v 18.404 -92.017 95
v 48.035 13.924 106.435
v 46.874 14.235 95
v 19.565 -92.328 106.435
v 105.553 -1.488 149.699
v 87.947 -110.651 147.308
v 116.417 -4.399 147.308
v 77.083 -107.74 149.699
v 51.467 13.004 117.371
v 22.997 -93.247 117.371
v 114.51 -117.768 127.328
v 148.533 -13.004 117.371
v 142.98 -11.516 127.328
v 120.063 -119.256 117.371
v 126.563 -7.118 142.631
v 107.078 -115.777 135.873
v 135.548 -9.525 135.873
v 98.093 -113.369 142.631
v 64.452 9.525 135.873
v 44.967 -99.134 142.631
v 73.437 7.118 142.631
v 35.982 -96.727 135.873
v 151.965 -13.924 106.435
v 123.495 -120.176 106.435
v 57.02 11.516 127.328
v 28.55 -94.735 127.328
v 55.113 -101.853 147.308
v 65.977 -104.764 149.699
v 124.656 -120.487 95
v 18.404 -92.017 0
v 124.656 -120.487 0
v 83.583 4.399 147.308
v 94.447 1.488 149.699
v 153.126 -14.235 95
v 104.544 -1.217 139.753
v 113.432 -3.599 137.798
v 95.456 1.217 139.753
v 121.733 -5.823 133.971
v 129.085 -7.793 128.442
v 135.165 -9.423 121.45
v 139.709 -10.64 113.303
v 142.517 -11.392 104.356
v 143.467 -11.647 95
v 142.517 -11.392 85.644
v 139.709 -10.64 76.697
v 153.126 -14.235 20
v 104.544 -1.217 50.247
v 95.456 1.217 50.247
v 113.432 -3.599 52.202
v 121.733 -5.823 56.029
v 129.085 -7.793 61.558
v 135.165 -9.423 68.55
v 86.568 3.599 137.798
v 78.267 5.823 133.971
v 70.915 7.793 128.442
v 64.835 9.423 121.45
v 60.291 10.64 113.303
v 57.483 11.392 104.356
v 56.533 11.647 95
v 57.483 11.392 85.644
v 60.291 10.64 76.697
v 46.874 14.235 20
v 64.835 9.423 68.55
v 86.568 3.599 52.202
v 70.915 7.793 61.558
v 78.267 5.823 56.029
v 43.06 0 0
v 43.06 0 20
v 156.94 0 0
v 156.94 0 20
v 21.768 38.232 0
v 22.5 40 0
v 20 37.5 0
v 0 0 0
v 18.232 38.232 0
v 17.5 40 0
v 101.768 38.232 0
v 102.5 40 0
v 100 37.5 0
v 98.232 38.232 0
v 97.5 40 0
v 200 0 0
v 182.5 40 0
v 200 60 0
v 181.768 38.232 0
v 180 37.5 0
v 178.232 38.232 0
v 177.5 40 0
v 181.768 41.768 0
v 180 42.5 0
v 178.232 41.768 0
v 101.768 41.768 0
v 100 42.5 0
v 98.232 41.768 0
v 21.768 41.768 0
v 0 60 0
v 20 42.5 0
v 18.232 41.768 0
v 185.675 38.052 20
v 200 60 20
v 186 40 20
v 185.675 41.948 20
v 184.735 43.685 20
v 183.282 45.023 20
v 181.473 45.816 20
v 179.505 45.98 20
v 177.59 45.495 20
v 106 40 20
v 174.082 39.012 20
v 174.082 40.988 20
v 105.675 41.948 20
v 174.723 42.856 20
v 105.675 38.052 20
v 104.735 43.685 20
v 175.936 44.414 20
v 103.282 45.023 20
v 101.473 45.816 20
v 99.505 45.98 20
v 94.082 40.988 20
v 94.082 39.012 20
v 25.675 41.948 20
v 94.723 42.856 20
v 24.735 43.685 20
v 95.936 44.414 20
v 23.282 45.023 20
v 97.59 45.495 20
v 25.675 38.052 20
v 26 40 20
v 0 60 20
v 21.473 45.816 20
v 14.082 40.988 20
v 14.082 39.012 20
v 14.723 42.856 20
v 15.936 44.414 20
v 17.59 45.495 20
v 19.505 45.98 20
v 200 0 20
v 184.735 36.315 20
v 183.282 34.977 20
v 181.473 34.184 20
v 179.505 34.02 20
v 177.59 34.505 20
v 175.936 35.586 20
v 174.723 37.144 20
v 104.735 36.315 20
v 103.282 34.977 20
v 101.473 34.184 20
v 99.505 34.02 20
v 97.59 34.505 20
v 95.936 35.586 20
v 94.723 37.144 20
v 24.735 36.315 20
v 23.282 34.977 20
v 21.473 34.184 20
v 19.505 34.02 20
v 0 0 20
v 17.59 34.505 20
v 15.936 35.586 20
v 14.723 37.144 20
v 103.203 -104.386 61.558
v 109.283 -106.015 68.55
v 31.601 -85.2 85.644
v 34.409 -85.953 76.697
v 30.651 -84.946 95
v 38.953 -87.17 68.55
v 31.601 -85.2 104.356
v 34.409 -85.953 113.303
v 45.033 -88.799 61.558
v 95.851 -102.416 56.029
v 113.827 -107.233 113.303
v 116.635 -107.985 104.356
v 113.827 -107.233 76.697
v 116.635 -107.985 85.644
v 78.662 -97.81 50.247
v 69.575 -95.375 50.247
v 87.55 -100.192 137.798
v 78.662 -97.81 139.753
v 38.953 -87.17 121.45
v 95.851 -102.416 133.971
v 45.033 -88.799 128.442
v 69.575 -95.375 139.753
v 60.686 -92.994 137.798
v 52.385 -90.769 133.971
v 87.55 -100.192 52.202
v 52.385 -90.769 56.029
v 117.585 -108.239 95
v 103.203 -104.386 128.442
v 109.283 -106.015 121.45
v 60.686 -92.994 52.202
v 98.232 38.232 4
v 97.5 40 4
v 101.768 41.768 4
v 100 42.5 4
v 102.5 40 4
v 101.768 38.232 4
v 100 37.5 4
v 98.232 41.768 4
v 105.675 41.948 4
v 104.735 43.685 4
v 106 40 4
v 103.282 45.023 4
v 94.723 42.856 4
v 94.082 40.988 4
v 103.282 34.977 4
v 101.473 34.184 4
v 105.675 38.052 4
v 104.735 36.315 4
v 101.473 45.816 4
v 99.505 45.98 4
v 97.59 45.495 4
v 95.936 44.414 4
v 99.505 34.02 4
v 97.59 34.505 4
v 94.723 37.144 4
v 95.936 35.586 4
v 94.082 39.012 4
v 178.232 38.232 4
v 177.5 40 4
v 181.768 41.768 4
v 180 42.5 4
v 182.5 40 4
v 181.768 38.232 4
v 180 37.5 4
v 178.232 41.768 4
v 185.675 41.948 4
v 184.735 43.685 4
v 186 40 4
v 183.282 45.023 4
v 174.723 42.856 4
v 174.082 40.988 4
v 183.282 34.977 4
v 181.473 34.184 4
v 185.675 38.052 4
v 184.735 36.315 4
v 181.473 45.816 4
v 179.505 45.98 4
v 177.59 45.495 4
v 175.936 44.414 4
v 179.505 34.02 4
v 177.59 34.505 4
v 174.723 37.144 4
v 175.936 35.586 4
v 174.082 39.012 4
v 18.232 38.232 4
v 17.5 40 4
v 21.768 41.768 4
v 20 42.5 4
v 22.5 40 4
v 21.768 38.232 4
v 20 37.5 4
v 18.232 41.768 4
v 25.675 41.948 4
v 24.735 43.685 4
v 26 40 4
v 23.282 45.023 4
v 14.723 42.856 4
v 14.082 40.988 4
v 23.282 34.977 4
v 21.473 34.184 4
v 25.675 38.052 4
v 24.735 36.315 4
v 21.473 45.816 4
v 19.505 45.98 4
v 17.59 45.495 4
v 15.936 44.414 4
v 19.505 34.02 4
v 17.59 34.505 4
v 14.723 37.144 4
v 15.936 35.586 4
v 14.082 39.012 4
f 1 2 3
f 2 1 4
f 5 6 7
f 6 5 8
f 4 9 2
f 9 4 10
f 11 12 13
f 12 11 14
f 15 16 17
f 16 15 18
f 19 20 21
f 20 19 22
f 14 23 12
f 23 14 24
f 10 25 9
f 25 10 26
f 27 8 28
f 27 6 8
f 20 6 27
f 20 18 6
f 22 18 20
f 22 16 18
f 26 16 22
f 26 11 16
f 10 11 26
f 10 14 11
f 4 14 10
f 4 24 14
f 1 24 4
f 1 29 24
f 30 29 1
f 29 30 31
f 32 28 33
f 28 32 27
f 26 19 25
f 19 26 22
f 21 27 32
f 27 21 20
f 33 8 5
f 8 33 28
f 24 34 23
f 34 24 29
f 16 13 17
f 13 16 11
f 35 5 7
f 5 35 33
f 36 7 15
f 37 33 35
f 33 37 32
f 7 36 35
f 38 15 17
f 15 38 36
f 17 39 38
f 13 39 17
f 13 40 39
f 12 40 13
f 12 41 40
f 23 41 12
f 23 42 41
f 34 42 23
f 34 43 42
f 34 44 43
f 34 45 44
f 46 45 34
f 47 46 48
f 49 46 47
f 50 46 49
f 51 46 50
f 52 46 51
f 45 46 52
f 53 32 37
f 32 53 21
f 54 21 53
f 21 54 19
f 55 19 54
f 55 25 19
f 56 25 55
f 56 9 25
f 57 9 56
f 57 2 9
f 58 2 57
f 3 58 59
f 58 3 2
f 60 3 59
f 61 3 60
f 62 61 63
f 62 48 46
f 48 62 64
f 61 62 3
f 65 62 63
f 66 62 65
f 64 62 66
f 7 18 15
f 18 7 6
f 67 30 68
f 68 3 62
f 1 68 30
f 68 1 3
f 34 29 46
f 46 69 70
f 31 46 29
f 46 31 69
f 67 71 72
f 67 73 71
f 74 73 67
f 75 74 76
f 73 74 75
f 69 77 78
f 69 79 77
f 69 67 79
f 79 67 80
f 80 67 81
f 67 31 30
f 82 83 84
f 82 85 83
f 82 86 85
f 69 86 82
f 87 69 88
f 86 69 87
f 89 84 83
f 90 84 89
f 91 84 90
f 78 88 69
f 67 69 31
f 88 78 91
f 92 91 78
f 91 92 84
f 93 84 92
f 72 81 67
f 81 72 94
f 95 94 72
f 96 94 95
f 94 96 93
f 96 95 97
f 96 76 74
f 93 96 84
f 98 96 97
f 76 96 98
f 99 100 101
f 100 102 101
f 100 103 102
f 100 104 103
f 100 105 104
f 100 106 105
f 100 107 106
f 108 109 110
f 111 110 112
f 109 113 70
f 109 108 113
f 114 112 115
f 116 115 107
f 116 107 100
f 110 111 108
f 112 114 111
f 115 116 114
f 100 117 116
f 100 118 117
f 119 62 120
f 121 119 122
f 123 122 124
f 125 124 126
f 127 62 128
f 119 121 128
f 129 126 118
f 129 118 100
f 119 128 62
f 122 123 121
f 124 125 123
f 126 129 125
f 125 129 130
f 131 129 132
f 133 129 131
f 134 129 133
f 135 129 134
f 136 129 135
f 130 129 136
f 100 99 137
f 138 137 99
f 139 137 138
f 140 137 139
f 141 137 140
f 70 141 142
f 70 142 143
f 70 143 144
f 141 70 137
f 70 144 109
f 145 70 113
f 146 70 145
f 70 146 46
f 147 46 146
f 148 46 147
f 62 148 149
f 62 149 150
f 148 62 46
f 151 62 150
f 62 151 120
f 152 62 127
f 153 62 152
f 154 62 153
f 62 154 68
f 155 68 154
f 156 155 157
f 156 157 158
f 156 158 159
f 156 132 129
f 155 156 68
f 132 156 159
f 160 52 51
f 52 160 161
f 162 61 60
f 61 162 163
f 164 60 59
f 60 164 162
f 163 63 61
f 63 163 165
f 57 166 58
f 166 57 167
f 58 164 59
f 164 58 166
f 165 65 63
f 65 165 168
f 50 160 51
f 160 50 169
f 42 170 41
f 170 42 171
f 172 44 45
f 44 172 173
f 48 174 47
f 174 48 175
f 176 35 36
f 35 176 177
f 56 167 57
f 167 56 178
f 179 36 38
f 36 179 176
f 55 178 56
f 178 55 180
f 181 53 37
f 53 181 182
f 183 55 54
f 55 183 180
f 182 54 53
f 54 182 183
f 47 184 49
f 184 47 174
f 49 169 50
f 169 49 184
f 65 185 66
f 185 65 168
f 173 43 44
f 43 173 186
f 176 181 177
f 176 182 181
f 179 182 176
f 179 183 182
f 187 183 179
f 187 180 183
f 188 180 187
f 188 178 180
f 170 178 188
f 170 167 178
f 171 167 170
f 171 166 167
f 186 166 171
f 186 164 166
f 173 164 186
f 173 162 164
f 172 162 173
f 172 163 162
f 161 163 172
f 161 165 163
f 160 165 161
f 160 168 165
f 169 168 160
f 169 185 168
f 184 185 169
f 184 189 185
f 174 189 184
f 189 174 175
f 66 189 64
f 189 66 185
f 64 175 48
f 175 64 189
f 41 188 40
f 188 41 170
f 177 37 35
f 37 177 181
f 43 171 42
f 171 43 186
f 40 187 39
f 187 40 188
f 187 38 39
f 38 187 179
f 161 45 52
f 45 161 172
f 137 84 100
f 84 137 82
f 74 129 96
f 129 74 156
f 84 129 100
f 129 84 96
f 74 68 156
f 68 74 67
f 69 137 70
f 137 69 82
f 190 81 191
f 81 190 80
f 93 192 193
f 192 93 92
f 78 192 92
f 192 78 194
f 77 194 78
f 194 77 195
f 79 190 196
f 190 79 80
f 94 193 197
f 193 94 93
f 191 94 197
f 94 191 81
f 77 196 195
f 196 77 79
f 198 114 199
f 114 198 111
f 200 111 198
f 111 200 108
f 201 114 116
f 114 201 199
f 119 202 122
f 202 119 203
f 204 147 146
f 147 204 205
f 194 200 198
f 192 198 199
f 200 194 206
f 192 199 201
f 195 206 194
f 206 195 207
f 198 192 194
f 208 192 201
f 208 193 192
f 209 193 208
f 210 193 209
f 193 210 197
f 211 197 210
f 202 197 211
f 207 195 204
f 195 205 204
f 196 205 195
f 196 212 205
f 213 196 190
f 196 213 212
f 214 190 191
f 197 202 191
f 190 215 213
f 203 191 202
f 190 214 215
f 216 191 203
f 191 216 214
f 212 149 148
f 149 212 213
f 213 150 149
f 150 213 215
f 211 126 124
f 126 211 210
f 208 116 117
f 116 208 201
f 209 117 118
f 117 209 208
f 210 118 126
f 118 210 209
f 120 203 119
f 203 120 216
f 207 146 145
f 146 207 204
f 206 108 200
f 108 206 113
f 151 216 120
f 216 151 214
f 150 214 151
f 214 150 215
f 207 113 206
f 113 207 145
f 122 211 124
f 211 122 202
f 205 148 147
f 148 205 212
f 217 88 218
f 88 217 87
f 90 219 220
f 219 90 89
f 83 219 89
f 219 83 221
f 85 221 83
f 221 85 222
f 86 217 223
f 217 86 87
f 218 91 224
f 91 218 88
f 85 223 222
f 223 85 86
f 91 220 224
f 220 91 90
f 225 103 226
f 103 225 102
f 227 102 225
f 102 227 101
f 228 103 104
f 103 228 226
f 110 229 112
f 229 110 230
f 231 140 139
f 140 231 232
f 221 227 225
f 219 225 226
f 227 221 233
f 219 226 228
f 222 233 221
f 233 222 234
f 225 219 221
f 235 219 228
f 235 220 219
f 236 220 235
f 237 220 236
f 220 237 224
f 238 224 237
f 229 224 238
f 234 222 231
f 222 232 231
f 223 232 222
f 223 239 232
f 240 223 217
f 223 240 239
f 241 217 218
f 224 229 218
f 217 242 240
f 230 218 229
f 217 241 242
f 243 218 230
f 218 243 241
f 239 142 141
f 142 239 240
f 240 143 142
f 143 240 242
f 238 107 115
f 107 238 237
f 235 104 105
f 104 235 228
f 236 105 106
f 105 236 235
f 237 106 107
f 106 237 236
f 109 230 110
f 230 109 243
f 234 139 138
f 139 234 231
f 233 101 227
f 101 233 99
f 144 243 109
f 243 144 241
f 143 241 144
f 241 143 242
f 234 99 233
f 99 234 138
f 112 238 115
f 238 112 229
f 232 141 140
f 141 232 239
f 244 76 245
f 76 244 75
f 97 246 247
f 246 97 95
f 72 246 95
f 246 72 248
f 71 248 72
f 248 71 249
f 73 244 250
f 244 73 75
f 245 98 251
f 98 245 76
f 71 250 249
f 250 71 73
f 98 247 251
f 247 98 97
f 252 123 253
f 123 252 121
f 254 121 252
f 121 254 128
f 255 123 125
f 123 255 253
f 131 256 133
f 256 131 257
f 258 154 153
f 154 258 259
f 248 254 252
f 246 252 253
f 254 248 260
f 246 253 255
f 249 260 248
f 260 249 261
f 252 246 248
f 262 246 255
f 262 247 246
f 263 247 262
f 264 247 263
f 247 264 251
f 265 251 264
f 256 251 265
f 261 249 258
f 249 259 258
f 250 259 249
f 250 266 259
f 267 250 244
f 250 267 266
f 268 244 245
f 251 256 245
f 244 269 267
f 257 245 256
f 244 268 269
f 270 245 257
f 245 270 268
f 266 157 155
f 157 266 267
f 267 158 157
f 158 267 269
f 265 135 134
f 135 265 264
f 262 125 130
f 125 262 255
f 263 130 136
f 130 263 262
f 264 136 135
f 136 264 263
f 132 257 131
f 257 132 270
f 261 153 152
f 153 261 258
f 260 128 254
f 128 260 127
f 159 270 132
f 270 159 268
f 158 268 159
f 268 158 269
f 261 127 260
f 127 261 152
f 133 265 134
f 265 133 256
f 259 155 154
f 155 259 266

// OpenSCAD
pad=0.1;
padd=pad*2;
screw_d=5;
screw_r=screw_d/2;
screw_head_d=12;
screw_head_r=screw_head_d/2;
screw_wall=4;

bike_w=200;
bike_h=60;
bike_d=20;

cup_wall= 10;
cup_h_offset=80;
cup_h=100;
cup_outer_h=cup_h+cup_wall;
cup_d=90;
cup_r=cup_d/2;
cup_outer_d=cup_d+cup_wall*2;
cup_outer_r=cup_outer_d/2;
cup_d_offset=20;

between_screws=80;
screw_from_top=20;

seat_angle=-15;

idontwannatrig=40;

module screw_hole() {
        cylinder(r=screw_r,h=bike_d+padd);
        translate([0,0,screw_wall+pad])
        cylinder(r=screw_head_r,h=bike_d-screw_wall+pad);
}

difference() {
    union() {
        cube([bike_w,bike_h,bike_d]);
        translate([bike_w/2,0,cup_outer_r+bike_d+cup_d_offset])
        rotate([0,0,seat_angle])
        rotate([90,180,0])
        difference() {
            union() {
                cylinder(r=cup_outer_r, h=cup_outer_h);
                translate([-cup_outer_r,0.0])
                cube([cup_outer_d,bike_d+cup_d_offset+cup_outer_r,cup_outer_h]);
                translate([-cup_outer_r,cup_outer_r+bike_d,-idontwannatrig])
                cube([cup_outer_d,bike_d,cup_outer_h+idontwannatrig]);
            }
            translate([0,0,-pad])
            cylinder(r=cup_r, h=cup_h+pad);
        }
    }
    translate([bike_w/2,bike_h-screw_from_top,-pad]) {
        screw_hole();
        translate([between_screws,0,0])
        screw_hole();
        translate([-between_screws,0,0])
        screw_hole();
    }
}
